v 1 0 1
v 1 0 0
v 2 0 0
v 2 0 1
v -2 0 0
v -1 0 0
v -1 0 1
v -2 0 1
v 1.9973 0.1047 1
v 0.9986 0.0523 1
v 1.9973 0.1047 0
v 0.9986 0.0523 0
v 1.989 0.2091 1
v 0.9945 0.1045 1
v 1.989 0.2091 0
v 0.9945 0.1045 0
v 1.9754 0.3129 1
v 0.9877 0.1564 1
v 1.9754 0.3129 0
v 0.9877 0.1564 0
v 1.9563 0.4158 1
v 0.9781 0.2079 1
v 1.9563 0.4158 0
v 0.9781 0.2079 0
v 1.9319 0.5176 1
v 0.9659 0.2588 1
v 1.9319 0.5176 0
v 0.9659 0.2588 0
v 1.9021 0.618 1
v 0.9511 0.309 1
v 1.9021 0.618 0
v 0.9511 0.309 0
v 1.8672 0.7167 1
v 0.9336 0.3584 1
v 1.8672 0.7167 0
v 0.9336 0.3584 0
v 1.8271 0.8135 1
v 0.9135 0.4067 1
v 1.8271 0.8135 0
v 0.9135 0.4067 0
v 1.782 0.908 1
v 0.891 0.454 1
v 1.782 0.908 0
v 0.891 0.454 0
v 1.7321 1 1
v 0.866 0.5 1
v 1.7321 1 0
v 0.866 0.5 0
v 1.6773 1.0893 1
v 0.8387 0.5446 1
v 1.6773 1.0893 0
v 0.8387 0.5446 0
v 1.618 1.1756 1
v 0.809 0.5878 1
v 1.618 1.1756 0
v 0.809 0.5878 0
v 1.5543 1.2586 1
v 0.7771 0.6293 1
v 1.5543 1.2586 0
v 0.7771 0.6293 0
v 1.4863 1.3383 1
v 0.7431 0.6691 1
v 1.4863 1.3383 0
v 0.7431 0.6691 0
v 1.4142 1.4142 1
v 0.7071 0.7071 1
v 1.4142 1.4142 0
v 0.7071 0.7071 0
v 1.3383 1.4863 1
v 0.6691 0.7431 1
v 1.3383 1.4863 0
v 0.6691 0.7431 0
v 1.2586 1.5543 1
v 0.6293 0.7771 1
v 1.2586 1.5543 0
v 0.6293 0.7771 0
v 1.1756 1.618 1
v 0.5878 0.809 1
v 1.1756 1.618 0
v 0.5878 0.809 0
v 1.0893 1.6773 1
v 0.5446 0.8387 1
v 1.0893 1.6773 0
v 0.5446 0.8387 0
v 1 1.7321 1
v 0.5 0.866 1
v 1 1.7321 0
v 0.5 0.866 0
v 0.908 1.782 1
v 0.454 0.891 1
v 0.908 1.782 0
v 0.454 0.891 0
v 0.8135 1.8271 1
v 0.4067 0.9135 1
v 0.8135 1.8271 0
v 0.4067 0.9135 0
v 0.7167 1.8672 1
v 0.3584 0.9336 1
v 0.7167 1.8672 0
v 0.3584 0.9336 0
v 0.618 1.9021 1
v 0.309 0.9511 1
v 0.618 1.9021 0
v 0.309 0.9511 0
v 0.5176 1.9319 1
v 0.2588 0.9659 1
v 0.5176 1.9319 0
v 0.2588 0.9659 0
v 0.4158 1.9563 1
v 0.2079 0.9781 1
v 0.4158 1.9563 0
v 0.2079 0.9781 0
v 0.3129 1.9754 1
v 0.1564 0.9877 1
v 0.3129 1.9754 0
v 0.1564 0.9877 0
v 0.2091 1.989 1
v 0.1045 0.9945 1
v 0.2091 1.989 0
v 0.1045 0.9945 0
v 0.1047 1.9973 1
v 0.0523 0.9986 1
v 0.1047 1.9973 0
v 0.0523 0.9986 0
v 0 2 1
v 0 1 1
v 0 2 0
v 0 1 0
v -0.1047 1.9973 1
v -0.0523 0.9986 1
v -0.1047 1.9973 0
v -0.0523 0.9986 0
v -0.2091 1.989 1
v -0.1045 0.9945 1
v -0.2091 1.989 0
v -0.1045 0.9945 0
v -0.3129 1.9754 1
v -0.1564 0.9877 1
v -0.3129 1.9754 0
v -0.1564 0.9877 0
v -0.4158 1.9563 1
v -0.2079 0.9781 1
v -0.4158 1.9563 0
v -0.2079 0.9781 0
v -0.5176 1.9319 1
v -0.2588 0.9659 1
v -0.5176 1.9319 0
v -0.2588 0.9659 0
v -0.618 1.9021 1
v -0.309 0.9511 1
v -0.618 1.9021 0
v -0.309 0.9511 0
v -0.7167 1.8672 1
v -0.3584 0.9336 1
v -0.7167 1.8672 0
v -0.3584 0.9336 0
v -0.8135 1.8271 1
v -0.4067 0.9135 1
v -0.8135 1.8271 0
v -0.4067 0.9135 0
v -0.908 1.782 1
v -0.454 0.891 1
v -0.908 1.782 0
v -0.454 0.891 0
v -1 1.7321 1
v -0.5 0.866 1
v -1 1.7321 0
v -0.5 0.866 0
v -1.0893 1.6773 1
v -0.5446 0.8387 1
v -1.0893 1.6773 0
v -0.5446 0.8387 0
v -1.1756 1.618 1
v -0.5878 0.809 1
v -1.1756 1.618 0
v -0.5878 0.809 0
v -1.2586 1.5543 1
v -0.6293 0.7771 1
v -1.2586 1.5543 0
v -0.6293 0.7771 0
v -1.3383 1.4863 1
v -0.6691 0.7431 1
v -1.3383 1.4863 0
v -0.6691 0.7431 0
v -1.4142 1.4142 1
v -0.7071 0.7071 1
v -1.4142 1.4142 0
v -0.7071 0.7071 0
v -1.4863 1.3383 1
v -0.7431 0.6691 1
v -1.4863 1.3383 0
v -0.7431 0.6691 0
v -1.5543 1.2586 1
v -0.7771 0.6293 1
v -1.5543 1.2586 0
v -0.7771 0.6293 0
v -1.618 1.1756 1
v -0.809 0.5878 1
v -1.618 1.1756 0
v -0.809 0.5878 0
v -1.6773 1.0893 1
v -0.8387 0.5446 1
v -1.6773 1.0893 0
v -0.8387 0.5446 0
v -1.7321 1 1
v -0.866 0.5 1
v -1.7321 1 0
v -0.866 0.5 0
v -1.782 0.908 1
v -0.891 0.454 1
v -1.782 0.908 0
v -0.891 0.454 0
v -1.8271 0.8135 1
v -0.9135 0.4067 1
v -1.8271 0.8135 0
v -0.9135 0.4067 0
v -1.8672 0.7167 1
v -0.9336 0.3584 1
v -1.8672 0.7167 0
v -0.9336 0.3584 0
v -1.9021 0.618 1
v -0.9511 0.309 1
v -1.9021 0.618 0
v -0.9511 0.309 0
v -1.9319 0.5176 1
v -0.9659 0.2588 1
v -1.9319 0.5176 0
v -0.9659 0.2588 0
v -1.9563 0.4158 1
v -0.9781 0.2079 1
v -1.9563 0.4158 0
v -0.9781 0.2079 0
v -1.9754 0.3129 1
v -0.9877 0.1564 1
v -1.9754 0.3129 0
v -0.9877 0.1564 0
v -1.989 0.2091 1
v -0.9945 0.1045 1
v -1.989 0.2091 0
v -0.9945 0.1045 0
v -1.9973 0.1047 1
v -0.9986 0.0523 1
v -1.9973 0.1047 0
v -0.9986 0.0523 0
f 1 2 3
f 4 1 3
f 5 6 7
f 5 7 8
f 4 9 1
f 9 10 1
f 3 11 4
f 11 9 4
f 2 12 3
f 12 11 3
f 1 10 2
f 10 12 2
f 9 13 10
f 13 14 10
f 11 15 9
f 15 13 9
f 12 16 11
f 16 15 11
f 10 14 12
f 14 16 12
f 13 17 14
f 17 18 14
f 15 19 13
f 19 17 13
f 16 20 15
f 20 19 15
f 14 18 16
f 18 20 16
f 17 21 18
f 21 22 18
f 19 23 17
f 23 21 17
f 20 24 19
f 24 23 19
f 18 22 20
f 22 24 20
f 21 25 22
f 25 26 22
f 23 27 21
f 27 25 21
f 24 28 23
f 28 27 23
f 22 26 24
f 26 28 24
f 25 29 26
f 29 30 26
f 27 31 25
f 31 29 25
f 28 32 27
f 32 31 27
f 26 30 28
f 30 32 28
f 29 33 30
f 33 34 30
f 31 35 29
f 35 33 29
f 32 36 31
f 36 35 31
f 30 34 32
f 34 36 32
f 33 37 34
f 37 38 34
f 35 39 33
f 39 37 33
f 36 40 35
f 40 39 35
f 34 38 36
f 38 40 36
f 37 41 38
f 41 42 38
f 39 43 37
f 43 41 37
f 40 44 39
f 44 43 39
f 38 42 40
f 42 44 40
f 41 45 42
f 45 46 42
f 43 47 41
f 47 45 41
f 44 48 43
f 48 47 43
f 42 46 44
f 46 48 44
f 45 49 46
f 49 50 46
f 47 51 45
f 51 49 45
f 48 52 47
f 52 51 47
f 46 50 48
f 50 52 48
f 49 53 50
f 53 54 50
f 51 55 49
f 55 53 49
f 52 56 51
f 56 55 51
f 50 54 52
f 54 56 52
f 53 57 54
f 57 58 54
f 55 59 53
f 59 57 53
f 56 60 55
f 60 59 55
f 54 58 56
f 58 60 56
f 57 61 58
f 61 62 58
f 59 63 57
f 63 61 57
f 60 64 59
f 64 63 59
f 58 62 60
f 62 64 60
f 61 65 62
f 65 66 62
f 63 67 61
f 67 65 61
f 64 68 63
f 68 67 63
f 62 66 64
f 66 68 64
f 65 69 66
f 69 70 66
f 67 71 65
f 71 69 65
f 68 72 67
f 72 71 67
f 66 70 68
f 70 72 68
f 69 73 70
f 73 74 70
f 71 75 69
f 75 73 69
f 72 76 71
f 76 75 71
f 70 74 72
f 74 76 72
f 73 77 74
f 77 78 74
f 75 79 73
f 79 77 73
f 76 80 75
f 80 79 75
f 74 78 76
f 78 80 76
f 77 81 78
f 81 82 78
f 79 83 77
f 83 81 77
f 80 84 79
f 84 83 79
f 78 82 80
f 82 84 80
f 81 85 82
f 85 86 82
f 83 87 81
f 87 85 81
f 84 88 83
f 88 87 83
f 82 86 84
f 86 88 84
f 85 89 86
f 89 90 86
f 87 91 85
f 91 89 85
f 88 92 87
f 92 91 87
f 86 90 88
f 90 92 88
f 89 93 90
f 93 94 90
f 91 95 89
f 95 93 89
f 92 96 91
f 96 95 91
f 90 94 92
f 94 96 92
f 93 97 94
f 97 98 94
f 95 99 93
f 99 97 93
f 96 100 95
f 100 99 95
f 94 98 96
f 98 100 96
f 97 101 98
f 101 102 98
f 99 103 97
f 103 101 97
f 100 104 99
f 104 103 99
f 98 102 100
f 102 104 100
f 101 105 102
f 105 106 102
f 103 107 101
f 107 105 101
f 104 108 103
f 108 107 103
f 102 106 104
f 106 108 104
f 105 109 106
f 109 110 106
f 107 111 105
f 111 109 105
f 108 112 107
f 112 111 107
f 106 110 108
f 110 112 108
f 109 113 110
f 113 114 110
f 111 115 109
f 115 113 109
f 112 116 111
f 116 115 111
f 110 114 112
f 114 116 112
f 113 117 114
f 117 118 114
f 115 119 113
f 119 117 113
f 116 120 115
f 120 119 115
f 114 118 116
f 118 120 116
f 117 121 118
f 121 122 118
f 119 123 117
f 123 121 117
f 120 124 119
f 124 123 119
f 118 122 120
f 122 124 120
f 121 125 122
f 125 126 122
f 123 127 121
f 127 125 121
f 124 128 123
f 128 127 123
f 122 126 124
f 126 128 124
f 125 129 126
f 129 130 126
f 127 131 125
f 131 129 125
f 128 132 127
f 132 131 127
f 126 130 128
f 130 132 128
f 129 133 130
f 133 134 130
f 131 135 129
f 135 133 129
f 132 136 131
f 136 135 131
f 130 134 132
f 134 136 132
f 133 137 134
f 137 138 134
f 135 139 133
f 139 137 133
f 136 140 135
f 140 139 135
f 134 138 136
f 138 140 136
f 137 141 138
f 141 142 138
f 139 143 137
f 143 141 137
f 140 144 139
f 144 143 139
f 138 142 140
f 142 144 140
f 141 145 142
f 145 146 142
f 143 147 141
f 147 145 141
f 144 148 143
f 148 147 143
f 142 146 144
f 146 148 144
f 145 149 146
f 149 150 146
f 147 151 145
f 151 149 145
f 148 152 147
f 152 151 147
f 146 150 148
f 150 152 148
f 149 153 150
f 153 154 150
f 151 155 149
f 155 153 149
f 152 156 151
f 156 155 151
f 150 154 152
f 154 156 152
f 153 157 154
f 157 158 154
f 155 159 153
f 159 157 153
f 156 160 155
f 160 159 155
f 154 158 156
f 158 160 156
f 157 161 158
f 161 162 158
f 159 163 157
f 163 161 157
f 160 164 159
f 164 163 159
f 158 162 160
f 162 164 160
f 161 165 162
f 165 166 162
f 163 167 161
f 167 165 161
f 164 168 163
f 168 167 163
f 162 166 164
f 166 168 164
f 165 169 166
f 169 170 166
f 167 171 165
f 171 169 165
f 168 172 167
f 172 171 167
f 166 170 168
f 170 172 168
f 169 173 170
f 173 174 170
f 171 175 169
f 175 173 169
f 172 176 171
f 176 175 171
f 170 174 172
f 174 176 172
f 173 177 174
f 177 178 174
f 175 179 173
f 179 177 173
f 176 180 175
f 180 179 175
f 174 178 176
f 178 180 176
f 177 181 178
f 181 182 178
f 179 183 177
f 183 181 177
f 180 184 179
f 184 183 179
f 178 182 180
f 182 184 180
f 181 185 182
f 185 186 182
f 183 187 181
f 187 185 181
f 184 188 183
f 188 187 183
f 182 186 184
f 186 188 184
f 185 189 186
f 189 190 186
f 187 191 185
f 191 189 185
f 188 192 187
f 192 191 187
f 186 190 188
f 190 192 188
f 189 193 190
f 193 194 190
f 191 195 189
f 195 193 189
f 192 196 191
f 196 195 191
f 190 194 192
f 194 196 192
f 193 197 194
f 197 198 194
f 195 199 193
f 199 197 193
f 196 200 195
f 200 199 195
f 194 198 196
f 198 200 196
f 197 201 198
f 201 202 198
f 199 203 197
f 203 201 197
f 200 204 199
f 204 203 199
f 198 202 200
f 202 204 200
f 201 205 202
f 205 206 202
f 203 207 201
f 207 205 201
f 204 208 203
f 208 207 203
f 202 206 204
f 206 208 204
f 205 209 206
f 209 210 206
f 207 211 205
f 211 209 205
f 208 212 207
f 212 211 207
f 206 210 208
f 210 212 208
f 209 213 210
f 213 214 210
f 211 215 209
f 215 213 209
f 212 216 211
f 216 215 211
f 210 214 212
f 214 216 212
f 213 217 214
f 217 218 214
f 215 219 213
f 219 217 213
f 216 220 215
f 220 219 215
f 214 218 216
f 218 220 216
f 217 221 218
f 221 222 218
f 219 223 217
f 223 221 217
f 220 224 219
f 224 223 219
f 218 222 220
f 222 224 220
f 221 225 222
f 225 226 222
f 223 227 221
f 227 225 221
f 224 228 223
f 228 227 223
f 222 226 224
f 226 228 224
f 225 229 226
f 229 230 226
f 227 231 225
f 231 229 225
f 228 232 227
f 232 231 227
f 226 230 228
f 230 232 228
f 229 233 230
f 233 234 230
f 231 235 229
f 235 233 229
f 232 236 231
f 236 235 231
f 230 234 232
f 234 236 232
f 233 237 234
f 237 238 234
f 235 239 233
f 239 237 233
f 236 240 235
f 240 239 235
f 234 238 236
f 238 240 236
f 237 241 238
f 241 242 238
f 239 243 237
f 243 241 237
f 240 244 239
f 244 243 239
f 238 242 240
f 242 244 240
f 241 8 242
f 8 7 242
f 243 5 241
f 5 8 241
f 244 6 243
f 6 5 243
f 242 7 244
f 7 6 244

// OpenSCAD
//------------------------------------------------------------------------------------------
// THIS CODE WAS GENERATED WITH GRAPHSCAD
//------------------------------------------------------------------------------------------
// Graphscad is a graphical nodal editor to create .SCAD files
//
// More info : http://graphscad.free.fr
//
// Scad Files created with Graphscad can be edited by graphscad
// Scad Files created with Graphscad can be read by Openscad
//
//------------------------------------------------------------------------------------------
module rotateextrude()
{
 function node_square_matrix(i=0,j=0,k=0,l=0,m=0,n=0) = translate([1,0,0]);
 module node_square(i=0,j=0,k=0,l=0,m=0,n=0)
 {
  translate([1,0,0])square(size=[1,1],center=false);
 }
 function node_rotateextrude_matrix(i=0,j=0,k=0,l=0,m=0,n=0) = translate([0,0,0]);
 module node_rotateextrude(i=0,j=0,k=0,l=0,m=0,n=0)
 {
  rotate_extrude(angle=180,convexity=3,$fn=120)
  {
   node_square(i,j,k,l,m,n);
  }
 }
 node_rotateextrude();
 /*--------------------------------------------------------------------------------------------------------
  Graphscad Utils functions
  This code is Used By Graphscad Nodal Editor to generate SCAD files
 --------------------------------------------------------------------------------------------------------*/
 function det4x4(a) =
 a[0][0]*a[1][1]*a[2][2]*a[3][3] + a[0][0]*a[1][2]*a[2][3]*a[3][1] + a[0][0]*a[1][3]*a[2][1]*a[3][2]
 + a[0][1]*a[1][0]*a[2][3]*a[3][2] + a[0][1]*a[1][2]*a[2][0]*a[3][3] + a[0][1]*a[1][3]*a[2][2]*a[3][0]
 + a[0][2]*a[1][0]*a[2][1]*a[3][3] + a[0][2]*a[1][1]*a[2][3]*a[3][0] + a[0][2]*a[1][3]*a[2][0]*a[3][1]
 + a[0][3]*a[1][0]*a[2][2]*a[3][1] + a[0][3]*a[1][1]*a[2][0]*a[3][2] + a[0][3]*a[1][2]*a[2][1]*a[3][0]
 - a[0][0]*a[1][1]*a[2][3]*a[3][2] - a[0][0]*a[1][2]*a[2][1]*a[3][3] - a[0][0]*a[1][3]*a[2][2]*a[3][1]
 - a[0][1]*a[1][0]*a[2][2]*a[3][3] - a[0][1]*a[1][2]*a[2][3]*a[3][0] - a[0][1]*a[1][3]*a[2][0]*a[3][2]
 - a[0][2]*a[1][0]*a[2][3]*a[3][1] - a[0][2]*a[1][1]*a[2][0]*a[3][3] - a[0][2]*a[1][3]*a[2][1]*a[3][0]
 - a[0][3]*a[1][0]*a[2][1]*a[3][2] - a[0][3]*a[1][1]*a[2][2]*a[3][0] - a[0][3]*a[1][2]*a[2][0]*a[3][1];
 function invb00(a) = a[1][1]*a[2][2]*a[3][3] + a[1][2]*a[2][3]*a[3][1] + a[1][3]*a[2][1]*a[3][2] - a[1][1]*a[2][3]*a[3][2] - a[1][2]*a[2][1]*a[3][3] - a[1][3]*a[2][2]*a[3][1];
 function invb01(a) = a[0][1]*a[2][3]*a[3][2] + a[0][2]*a[2][1]*a[3][3] + a[0][3]*a[2][2]*a[3][1] - a[0][1]*a[2][2]*a[3][3] - a[0][2]*a[2][3]*a[3][1] - a[0][3]*a[2][1]*a[3][2];
 function invb02(a) = a[0][1]*a[1][2]*a[3][3] + a[0][2]*a[1][3]*a[3][1] + a[0][3]*a[1][1]*a[3][2] - a[0][1]*a[1][3]*a[3][2] - a[0][2]*a[1][1]*a[3][3] - a[0][3]*a[1][2]*a[3][1];
 function invb03(a) = a[0][1]*a[1][3]*a[2][2] + a[0][2]*a[1][1]*a[2][3] + a[0][3]*a[1][2]*a[2][1] - a[0][1]*a[1][2]*a[2][3] - a[0][2]*a[1][3]*a[2][1] - a[0][3]*a[1][1]*a[2][2];
 function invb10(a) = a[1][0]*a[2][3]*a[3][2] + a[1][2]*a[2][0]*a[3][3] + a[1][3]*a[2][2]*a[3][0] - a[1][0]*a[2][2]*a[3][3] - a[1][2]*a[2][3]*a[3][0] - a[1][3]*a[2][0]*a[3][2];
 function invb11(a) = a[0][0]*a[2][2]*a[3][3] + a[0][2]*a[2][3]*a[3][0] + a[0][3]*a[2][0]*a[3][2] - a[0][0]*a[2][3]*a[3][2] - a[0][2]*a[2][0]*a[3][3] - a[0][3]*a[2][2]*a[3][0];
 function invb12(a) = a[0][0]*a[1][3]*a[3][2] + a[0][2]*a[1][0]*a[3][3] + a[0][3]*a[1][2]*a[3][0] - a[0][0]*a[1][2]*a[3][3] - a[0][2]*a[1][3]*a[3][0] - a[0][3]*a[1][0]*a[3][2];
 function invb13(a) = a[0][0]*a[1][2]*a[2][3] + a[0][2]*a[1][3]*a[2][0] + a[0][3]*a[1][0]*a[2][2] - a[0][0]*a[1][3]*a[2][2] - a[0][2]*a[1][0]*a[2][3] - a[0][3]*a[1][2]*a[2][0];
 function invb20(a) = a[1][0]*a[2][1]*a[3][3] + a[1][1]*a[2][3]*a[3][0] + a[1][3]*a[2][0]*a[3][1] - a[1][0]*a[2][3]*a[3][1] - a[1][1]*a[2][0]*a[3][3] - a[1][3]*a[2][1]*a[3][0];
 function invb21(a) = a[0][0]*a[2][3]*a[3][1] + a[0][1]*a[2][0]*a[3][3] + a[0][3]*a[2][1]*a[3][0] - a[0][0]*a[2][1]*a[3][3] - a[0][1]*a[2][3]*a[3][0] - a[0][3]*a[2][0]*a[3][1];
 function invb22(a) = a[0][0]*a[1][1]*a[3][3] + a[0][1]*a[1][3]*a[3][0] + a[0][3]*a[1][0]*a[3][1] - a[0][0]*a[1][3]*a[3][1] - a[0][1]*a[1][0]*a[3][3] - a[0][3]*a[1][1]*a[3][0];
 function invb23(a) = a[0][0]*a[1][3]*a[2][1] + a[0][1]*a[1][0]*a[2][3] + a[0][3]*a[1][1]*a[2][0] - a[0][0]*a[1][1]*a[2][3] - a[0][1]*a[1][3]*a[2][0] - a[0][3]*a[1][0]*a[2][1];
 function invb30(a) = a[1][0]*a[2][2]*a[3][1] + a[1][1]*a[2][0]*a[3][2] + a[1][2]*a[2][1]*a[3][0] - a[1][0]*a[2][1]*a[3][2] - a[1][1]*a[2][2]*a[3][0] - a[1][2]*a[2][0]*a[3][1];
 function invb31(a) = a[0][0]*a[2][1]*a[3][2] + a[0][1]*a[2][2]*a[3][0] + a[0][2]*a[2][0]*a[3][1] - a[0][0]*a[2][2]*a[3][1] - a[0][1]*a[2][0]*a[3][2] - a[0][2]*a[2][1]*a[3][0];
 function invb32(a) = a[0][0]*a[1][2]*a[3][1] + a[0][1]*a[1][0]*a[3][2] + a[0][2]*a[1][1]*a[3][0] - a[0][0]*a[1][1]*a[3][2] - a[0][1]*a[1][2]*a[3][0] - a[0][2]*a[1][0]*a[3][1];
 function invb33(a) = a[0][0]*a[1][1]*a[2][2] + a[0][1]*a[1][2]*a[2][0] + a[0][2]*a[1][0]*a[2][1] - a[0][0]*a[1][2]*a[2][1] - a[0][1]*a[1][0]*a[2][2] - a[0][2]*a[1][1]*a[2][0];
 function inv4x4(a)= (1/det4x4(a))*[
 [invb00(a),invb01(a),invb02(a),invb03(a)],
 [invb10(a),invb11(a),invb12(a),invb13(a)],
 [invb20(a),invb21(a),invb22(a),invb23(a)],
 [invb30(a),invb31(a),invb32(a),invb33(a)]];
 function onlytranslate(a)=  [
                        [1,0,0,a[0][3]],
                        [0,1,0,a[1][3]],
                        [0,0,1,a[2][3]],
                        [0,0,0,1]];
 function negonlytranslate(a)=[
                        [1,0,0,-a[0][3]],
                        [0,1,0,-a[1][3]],
                        [0,0,1,-a[2][3]],
                        [0,0,0,1]];
 function lookatvec(t,parentmat) = [t[0]-parentmat[0][3],
                                 t[1]-parentmat[1][3],
                                 t[2]-parentmat[2][3]];
 /*
              rx = '0'
              ry = 'acos('+tz+'/norm(['+tx+','+ty+','+tz+']))'
              rz = 'atan2('+ty+','+tx+')'
 */
 function lookatrot(t,parentmat) = [0,
                                 acos((t[2]-parentmat[2][3])/norm(lookatvec(t,parentmat))),
                                 atan2(t[1]-parentmat[1][3],t[0]-parentmat[0][3])];
 function gettranslation(m) = [m[0][3],m[1][3],m[2][3]];
 function vectormulmatrix(v,m) = m*v;
 function vectorlength(v) = norm(v);
 function vectorx(v) = v[0];
 function vectory(v) = v[1];
 function vectorz(v) = v[2];
 function vectoradd(a,b) = (a+b);
 function vectorsub(a,b) = (a-b);
 function vectormul(a,b) = (a*b);
 function vectordiv(a,b) = (a*(1/b));
 function scale(v)=[[v[0],0,0,0],
                    [0,v[1],0,0],
                    [0,0,v[2],0],
                    [0,0,0,1]];
 function rotatex(a)=[[1,0,0,0],
                      [0,cos(a),-sin(a),0],
                      [0,sin(a),cos(a),0],
                      [0,0,0,1]];
 function rotatey(a)=[[cos(a),0,sin(a),0],
                      [0,1,0,0],
                      [-sin(a),0,cos(a),0],
                      [0,0,0,1]];
 function rotatez(a)=[[cos(a),-sin(a),0,0],
                      [sin(a),cos(a),0,0],
                      [0,0,1,0],
                      [0,0,0,1]];
 function rotatea(c,s,l,m,n)=[[l*l*(1-c)+c,m*l*(1-c)-n*s,n*l*(1-c)+m*s,0],
                              [l*m*(1-c)+n*s,m*m*(1-c)+c,n*m*(1-c)-l*s,0],
                              [l*n*(1-c)-m*s,m*n*(1-c)+l*s,n*n*(1-c)+c,0],
                              [0,0,0,1]];
 function rotateanv(a,nv)=rotatea(cos(a),sin(a),nv[0],nv[1],nv[2]);
 function rotate(a,v, normV=true)=(v==undef)?rotatez(a[2])*rotatey(a[1])*rotatex(a[0]):
                      normV ? rotateanv(a,v/sqrt(v*v)) : rotateanv(a,v);
 function translate(v)=[[1,0,0,v[0]],
                        [0,1,0,v[1]],
                        [0,0,1,v[2]],
                        [0,0,0,1]];
 function mirrorabc(a,b,c)=[[1-2*a*a,-2*a*b,-2*a*c,0],
                            [-2*a*b,1-2*b*b,-2*b*c,0],
                            [-2*a*c,-2*b*c,1-2*c*c,0],
                            [0,0,0,1]];
 function mirrornv(nv)=mirrorabc(nv[0],nv[1],nv[2]);
 function mirror(v)=mirrornv(v/sqrt(v*v));
}
rotateextrude();


/*BEGINGRAPHSCAD{
    "nodes": [
        {
            "name": "node_square",
            "inputplugs": [
                {
                    "type": "str",
                    "name": "x",
                    "value": "1"
                },
                {
                    "type": "str",
                    "name": "y",
                    "value": "1"
                },
                {
                    "type": "str",
                    "name": "tx",
                    "value": "1"
                },
                {
                    "type": "str",
                    "name": "ty",
                    "value": "0"
                },
                {
                    "type": "str",
                    "name": "center",
                    "value": "false",
                    "combo": [
                        "true",
                        "false"
                    ]
                }
            ],
            "typename": "Node_square",
            "version": 1,
            "y": 71.18358779014685,
            "x": -4325.341933308979
        },
        {
            "name": "node_rotateextrude",
            "inputplugs": [
                {
                    "connection": "node_square.object2d",
                    "type": "object2d",
                    "name": "object2d",
                    "value": ""
                },
                {
                    "type": "str",
                    "name": "angle",
                    "value": "180"
                },
                {
                    "type": "str",
                    "name": "convexity",
                    "value": "3"
                },
                {
                    "type": "str",
                    "name": "$fn",
                    "value": "120"
                }
            ],
            "typename": "Node_rotateextrude",
            "version": 1,
            "y": 75.64535690558907,
            "x": -4087.5368358577034
        }
    ],
    "version": 2
}ENDGRAPHSCAD*/
